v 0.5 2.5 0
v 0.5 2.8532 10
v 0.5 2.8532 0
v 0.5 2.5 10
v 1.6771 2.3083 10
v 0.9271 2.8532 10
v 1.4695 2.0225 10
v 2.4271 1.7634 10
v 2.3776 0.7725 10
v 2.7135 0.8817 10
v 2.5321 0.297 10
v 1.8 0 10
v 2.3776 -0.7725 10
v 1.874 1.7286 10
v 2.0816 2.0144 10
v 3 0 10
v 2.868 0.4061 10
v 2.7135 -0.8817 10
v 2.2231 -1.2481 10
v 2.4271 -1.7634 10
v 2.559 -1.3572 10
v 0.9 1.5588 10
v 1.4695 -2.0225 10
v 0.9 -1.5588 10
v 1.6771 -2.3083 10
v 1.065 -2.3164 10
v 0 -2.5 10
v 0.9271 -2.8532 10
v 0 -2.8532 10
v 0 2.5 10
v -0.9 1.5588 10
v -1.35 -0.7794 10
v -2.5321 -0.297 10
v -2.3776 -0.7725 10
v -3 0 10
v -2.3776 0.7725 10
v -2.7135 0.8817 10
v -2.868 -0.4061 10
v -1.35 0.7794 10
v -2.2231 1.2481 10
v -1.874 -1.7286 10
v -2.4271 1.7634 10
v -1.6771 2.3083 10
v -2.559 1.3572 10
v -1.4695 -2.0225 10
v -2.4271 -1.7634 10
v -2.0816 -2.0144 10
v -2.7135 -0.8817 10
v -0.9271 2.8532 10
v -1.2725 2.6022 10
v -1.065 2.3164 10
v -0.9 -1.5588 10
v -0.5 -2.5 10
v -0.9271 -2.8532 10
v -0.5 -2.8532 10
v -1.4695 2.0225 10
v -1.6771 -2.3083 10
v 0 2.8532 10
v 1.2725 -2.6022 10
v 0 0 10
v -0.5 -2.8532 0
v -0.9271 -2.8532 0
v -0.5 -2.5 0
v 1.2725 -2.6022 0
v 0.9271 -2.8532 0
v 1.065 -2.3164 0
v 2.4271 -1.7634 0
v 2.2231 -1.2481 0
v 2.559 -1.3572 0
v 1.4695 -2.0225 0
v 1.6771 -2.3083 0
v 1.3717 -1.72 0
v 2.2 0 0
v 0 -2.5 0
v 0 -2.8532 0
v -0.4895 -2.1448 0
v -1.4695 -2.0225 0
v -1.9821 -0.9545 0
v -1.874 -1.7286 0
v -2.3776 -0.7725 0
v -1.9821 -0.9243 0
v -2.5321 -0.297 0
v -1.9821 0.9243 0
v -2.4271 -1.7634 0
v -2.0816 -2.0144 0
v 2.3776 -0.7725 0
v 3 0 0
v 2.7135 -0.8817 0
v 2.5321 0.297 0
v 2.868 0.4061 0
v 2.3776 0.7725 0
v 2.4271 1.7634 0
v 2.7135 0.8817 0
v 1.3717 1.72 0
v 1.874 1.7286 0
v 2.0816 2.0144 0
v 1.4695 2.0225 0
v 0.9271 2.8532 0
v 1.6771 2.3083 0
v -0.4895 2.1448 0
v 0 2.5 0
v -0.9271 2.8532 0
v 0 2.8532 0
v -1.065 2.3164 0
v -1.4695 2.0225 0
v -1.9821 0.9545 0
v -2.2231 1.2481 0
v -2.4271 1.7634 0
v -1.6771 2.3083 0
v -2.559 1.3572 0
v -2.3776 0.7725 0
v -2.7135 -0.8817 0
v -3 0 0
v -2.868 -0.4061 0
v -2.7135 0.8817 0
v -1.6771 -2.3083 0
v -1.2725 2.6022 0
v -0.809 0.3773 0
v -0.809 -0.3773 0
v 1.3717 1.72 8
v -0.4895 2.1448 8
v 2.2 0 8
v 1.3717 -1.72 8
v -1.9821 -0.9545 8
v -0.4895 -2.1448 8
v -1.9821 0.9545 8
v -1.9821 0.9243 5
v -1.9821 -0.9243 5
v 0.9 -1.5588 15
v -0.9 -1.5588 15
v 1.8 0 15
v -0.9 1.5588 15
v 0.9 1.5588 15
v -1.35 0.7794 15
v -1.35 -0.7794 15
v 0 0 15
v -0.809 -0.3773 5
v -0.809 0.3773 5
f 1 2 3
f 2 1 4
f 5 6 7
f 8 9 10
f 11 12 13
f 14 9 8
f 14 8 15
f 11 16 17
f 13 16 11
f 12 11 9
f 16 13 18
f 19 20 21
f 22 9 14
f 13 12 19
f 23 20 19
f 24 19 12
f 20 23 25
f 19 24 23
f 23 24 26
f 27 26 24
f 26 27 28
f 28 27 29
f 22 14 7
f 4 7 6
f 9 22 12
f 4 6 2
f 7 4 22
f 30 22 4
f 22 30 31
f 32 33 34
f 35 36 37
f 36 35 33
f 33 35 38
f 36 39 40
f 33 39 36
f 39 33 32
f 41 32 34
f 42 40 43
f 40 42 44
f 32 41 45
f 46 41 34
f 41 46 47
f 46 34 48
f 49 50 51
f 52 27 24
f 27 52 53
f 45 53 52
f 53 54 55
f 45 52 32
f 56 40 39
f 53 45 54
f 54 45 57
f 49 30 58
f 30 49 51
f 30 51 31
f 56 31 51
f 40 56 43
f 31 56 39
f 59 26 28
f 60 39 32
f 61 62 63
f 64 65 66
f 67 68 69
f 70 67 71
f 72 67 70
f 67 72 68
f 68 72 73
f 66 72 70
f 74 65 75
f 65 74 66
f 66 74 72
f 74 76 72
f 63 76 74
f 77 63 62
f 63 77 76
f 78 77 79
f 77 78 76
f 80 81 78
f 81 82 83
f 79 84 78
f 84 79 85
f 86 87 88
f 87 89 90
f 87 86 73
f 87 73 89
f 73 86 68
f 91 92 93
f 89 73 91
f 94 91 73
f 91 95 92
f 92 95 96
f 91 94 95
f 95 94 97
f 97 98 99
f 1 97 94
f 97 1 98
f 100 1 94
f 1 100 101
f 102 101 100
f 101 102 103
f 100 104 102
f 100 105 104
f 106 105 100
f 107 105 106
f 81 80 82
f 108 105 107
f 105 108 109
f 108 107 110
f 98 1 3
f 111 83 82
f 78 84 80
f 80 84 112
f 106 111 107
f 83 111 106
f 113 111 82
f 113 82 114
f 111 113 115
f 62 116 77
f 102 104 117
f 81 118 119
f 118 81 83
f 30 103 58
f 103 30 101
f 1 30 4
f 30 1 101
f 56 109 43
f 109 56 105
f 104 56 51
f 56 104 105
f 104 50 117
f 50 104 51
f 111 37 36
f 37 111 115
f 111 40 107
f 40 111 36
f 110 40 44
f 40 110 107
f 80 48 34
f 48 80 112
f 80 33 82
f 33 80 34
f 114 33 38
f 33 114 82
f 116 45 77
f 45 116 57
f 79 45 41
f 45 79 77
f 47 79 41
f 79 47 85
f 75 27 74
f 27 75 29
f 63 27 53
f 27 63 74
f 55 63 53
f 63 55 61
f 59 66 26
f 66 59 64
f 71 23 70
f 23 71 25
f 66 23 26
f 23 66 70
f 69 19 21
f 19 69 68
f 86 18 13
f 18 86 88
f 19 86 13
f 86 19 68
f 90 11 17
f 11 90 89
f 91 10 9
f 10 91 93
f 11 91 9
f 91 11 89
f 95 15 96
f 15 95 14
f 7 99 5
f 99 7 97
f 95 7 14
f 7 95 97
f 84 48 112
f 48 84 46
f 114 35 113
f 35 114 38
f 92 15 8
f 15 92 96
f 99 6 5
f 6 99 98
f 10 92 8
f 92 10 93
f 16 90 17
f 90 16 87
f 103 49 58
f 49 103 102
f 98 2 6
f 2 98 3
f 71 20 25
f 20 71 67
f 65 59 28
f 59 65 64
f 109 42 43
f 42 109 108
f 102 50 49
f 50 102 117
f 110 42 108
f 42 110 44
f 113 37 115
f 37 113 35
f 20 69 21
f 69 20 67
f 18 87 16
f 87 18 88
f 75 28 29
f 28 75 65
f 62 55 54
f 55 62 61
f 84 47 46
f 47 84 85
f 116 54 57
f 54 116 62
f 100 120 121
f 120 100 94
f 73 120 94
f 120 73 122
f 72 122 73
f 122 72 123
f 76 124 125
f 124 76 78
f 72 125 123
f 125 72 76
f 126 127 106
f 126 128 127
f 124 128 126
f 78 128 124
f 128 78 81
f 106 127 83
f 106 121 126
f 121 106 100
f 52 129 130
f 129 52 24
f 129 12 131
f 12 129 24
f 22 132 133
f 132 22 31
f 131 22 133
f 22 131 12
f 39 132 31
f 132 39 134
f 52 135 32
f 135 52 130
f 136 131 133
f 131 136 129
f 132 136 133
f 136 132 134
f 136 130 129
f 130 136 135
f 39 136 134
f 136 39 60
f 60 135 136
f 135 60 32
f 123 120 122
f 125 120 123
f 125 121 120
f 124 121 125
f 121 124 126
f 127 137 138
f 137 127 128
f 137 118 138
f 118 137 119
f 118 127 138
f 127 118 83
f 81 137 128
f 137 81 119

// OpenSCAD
// file: ArcOfCylinder.scad
// parameters
R_OUTER = 5;
R_INNER = 4;
HEIGHT = 10;
ANGLE1 = 120;
ANGLE2 = 330;

module Pipe(r_outer, r_inner, height) {
    difference() {
        cylinder(r=r_outer, h=height);
        cylinder(r=r_inner, h=height);
    }
}

module Prism(l, w, h) {
    polyhedron(
       points=[[0,0,0], [l,0,0], [0,w,0], [0,w,h], [l,0,h], [0,0,h]],
       faces=[[0,1,2],[0,5,4,1],[1,4,3,2],[2,3,5,0],[3,4,5]]
   );
}

module EquilateralPrism(a, h){
    union() {
        Prism(l=sqrt(3)/2*a, w=a/2, h=h);
        mirror([0, 1, 0])
            Prism(l=sqrt(3)/2*a, w=a/2, h=h);
    }
}

module ArcOfCylinder(r_outer, r_inner, height, angle) {

    prism_angle = angle>=180? 360 - angle: angle;
    bottom_edge_length = 2 * r_outer * sin(prism_angle / 2);
    r_ircumscribed_circle = sqrt(3) / 4 * bottom_edge_length;
    triangle_height = (sqrt(3) / 2 * bottom_edge_length);
    target_trinangle_height = (r_outer * cos(prism_angle / 2));
    x_scale = target_trinangle_height / triangle_height;

    // if angle is over 180 then get difference in pipe, prism and cube.
    // else, get intersection in pipe and (prism and cube).
    if (angle >= 180) {

        difference() {
            Pipe(r_outer=r_outer, r_inner=r_inner, height=height);
            translate([-target_trinangle_height, 0, 0])
                scale([x_scale, 1, 1])
                    EquilateralPrism(a=bottom_edge_length, h=height);
            translate([-(target_trinangle_height+r_outer/2), 0, height/2])
                cube([r_outer, bottom_edge_length, height], center=true);
        }

    } else {

        intersection() {
            Pipe(r_outer=r_outer, r_inner=r_inner, height=height);
            union() {
                translate([-target_trinangle_height, 0, 0])
                    scale([x_scale, 1, 1])
                        EquilateralPrism(a=bottom_edge_length, h=height);
                translate([-(target_trinangle_height+r_outer/2), 0, height/2])
                    cube([r_outer, bottom_edge_length, height], center=true);
            }
        }

    }
}

// main
ArcOfCylinder(R_OUTER, R_INNER, HEIGHT, ANGLE1);
translate([20, 0, 0])
    ArcOfCylinder(R_OUTER, R_INNER, HEIGHT, ANGLE2);
// main file
use <ArcOfCylinder.scad>;

// parameters
HEIGHT_BODY = 10;
HEIGHT_JOINT = 5;
R_OUTER = 3;
R_INNER = 2;
NUM_GROOVE = 10;
DEPTH_OF_GROOVE = 0.5;
WIDTH_OF_GROOVE = 0.5;

module ExtendablePipe(h, h_joint, r_outer, r_inner, num_groove,
                      depth_of_groove, width_of_groove) {
    difference() {
        cylinder(r=r_outer, h=h);
        cylinder(r=r_inner*1.1, h=h);
        
        // groove
        for ( i = [0 : num_groove] )
        {
            rotate( i * 360 / num_groove, [0, 0, 1])
                translate([0, r_outer-depth_of_groove, 0])
                    cube([width_of_groove, depth_of_groove, h]);
        }
    }

    // joint
    translate([0, 0, h]) {
        translate([0, 0, -2])
            cylinder(r=r_inner*1.1, h=2);
        ArcOfCylinder(r_outer=r_inner-0.2, r_inner=0, height=h_joint, angle=300);
    }
    ArcOfCylinder(r_outer=r_inner*1.1, r_inner=1, height=h_joint, angle=50);
}

// main
ExtendablePipe(HEIGHT_BODY, HEIGHT_JOINT, R_OUTER, R_INNER, NUM_GROOVE,
               DEPTH_OF_GROOVE, width_of_groove=WIDTH_OF_GROOVE);
